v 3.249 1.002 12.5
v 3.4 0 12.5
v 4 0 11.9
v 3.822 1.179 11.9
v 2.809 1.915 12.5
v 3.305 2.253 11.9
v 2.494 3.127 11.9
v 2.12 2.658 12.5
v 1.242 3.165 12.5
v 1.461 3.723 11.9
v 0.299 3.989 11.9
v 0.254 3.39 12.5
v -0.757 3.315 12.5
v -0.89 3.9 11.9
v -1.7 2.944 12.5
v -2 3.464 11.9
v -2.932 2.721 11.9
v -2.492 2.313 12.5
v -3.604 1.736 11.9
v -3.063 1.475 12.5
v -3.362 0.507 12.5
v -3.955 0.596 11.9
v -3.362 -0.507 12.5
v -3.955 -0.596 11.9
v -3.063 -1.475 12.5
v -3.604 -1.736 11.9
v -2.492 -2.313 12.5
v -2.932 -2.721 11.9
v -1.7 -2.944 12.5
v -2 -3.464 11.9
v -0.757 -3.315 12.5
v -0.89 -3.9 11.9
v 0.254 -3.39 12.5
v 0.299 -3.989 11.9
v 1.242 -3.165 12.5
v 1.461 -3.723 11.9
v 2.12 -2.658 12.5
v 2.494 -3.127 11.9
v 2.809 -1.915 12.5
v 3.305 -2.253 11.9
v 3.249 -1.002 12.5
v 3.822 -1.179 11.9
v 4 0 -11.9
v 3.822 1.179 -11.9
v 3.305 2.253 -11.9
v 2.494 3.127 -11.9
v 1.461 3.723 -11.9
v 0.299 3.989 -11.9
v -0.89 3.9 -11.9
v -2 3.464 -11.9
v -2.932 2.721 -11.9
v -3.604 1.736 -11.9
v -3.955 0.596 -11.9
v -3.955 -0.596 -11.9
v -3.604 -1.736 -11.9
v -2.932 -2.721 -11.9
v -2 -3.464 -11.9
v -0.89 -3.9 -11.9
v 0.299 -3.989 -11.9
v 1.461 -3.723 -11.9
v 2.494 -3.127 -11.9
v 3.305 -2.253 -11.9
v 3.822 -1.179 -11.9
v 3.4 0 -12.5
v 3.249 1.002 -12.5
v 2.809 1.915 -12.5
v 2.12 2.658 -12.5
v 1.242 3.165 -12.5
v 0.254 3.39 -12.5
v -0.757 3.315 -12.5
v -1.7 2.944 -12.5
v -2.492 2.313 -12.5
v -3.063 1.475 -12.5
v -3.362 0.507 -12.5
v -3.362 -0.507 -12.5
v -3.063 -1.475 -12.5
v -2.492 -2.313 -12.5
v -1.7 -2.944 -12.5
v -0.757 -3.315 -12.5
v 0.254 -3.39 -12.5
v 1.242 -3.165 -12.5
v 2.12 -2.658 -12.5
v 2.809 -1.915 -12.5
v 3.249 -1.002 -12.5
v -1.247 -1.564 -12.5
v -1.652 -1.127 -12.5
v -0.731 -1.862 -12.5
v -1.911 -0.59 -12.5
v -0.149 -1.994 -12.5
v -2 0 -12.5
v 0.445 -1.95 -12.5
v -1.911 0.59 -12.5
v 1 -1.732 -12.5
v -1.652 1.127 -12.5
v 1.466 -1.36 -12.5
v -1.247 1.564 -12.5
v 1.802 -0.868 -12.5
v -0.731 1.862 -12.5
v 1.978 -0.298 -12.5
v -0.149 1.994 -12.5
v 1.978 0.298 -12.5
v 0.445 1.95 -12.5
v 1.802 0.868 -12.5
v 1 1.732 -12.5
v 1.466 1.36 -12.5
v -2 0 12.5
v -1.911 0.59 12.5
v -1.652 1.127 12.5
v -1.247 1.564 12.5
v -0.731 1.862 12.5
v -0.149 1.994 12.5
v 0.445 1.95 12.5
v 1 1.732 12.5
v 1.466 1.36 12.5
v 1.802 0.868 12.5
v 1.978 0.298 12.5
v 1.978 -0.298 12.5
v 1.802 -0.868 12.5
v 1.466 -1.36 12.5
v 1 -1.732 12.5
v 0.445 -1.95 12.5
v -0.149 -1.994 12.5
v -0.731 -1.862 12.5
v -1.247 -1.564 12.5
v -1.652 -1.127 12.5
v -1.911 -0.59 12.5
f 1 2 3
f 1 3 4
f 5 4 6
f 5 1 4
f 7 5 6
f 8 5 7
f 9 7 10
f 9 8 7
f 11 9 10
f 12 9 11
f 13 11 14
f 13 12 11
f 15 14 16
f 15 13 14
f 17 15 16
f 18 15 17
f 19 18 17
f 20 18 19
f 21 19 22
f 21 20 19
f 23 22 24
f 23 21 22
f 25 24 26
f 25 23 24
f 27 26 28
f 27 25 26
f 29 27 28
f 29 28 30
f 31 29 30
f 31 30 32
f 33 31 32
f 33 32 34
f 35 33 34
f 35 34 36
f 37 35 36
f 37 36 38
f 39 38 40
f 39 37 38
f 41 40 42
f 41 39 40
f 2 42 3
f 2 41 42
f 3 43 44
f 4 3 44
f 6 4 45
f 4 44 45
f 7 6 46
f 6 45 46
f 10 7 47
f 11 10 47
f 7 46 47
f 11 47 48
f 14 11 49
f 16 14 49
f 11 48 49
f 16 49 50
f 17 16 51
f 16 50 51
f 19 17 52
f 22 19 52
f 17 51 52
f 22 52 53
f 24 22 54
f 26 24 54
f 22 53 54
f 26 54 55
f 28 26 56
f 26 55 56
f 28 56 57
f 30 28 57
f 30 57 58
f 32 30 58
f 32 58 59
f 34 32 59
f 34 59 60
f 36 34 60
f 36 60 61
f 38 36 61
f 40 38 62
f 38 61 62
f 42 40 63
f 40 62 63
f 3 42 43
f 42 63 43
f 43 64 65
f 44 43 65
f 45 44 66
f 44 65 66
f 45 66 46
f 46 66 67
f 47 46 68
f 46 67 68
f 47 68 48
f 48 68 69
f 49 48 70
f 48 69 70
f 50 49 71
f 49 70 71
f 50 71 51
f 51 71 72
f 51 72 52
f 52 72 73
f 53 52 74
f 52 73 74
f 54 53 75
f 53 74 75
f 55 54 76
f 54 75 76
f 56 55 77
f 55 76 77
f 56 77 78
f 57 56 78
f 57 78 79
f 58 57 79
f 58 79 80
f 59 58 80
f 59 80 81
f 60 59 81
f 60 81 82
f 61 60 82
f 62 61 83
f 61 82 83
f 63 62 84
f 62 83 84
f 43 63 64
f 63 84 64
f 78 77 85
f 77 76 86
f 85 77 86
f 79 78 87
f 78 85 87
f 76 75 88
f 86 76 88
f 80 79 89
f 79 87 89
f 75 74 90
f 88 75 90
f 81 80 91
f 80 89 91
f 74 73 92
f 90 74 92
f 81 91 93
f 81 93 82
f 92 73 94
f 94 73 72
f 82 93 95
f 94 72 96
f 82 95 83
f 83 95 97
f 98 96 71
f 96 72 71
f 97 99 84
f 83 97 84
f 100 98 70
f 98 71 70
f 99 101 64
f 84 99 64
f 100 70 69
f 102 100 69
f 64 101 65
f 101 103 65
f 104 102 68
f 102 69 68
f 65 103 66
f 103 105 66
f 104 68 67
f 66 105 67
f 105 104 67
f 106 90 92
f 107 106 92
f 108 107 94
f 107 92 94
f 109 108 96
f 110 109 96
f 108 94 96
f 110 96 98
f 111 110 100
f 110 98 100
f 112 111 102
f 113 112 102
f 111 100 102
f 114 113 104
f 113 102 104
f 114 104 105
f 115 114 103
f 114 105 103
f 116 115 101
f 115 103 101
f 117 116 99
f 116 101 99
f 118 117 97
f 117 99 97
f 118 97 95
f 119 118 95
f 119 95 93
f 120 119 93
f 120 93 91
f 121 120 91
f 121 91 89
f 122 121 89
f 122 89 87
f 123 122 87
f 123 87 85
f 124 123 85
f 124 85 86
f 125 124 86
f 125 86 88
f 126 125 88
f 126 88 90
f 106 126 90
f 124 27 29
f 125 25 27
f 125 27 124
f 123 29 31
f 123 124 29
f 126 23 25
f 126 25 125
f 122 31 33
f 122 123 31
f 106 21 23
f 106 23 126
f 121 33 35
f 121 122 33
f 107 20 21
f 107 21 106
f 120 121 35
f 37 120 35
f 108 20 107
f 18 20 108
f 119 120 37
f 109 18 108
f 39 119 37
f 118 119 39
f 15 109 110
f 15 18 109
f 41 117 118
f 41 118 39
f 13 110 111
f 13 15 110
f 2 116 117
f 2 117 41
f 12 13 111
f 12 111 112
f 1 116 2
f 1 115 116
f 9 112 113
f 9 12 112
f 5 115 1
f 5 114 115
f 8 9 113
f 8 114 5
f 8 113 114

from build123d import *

# Parameters (mm, degrees)
BOSS_EXTRUDE1_DEPTH      = 12.5
BOSS_EXTRUDE1_DEPTH_BACK = 12.5
SKETCH3_R                = 4
CHAMFER1_SIZE            = 0.6
SKETCH4_R                = 2
CUT_EXTRUDE1_DEPTH       = 42


with BuildPart() as part:
    # Sketch3 → Boss-Extrude1 (new, two sides: drawn at the far end of the back side and taken through both)
    with BuildSketch(Plane.XY.offset(-BOSS_EXTRUDE1_DEPTH_BACK)):
        Circle(SKETCH3_R)
    extrude(amount=BOSS_EXTRUDE1_DEPTH + BOSS_EXTRUDE1_DEPTH_BACK)

    # Chamfer1
    chamfer1_edges = [part.edges().sort_by_distance(p)[0] for p in [
        (-4, 0, -12.5),
        (-4, 0, 12.5),
    ]]
    chamfer(chamfer1_edges, length=CHAMFER1_SIZE)

    # Sketch4 → Cut-Extrude1 (cut)
    with BuildSketch(Plane(origin=(0, 0, -12.5), x_dir=(-1, 0, 0), z_dir=(0, 0, -1))):
        Circle(SKETCH4_R)
    extrude(amount=-CUT_EXTRUDE1_DEPTH, mode=Mode.SUBTRACT)


solid = part.part
